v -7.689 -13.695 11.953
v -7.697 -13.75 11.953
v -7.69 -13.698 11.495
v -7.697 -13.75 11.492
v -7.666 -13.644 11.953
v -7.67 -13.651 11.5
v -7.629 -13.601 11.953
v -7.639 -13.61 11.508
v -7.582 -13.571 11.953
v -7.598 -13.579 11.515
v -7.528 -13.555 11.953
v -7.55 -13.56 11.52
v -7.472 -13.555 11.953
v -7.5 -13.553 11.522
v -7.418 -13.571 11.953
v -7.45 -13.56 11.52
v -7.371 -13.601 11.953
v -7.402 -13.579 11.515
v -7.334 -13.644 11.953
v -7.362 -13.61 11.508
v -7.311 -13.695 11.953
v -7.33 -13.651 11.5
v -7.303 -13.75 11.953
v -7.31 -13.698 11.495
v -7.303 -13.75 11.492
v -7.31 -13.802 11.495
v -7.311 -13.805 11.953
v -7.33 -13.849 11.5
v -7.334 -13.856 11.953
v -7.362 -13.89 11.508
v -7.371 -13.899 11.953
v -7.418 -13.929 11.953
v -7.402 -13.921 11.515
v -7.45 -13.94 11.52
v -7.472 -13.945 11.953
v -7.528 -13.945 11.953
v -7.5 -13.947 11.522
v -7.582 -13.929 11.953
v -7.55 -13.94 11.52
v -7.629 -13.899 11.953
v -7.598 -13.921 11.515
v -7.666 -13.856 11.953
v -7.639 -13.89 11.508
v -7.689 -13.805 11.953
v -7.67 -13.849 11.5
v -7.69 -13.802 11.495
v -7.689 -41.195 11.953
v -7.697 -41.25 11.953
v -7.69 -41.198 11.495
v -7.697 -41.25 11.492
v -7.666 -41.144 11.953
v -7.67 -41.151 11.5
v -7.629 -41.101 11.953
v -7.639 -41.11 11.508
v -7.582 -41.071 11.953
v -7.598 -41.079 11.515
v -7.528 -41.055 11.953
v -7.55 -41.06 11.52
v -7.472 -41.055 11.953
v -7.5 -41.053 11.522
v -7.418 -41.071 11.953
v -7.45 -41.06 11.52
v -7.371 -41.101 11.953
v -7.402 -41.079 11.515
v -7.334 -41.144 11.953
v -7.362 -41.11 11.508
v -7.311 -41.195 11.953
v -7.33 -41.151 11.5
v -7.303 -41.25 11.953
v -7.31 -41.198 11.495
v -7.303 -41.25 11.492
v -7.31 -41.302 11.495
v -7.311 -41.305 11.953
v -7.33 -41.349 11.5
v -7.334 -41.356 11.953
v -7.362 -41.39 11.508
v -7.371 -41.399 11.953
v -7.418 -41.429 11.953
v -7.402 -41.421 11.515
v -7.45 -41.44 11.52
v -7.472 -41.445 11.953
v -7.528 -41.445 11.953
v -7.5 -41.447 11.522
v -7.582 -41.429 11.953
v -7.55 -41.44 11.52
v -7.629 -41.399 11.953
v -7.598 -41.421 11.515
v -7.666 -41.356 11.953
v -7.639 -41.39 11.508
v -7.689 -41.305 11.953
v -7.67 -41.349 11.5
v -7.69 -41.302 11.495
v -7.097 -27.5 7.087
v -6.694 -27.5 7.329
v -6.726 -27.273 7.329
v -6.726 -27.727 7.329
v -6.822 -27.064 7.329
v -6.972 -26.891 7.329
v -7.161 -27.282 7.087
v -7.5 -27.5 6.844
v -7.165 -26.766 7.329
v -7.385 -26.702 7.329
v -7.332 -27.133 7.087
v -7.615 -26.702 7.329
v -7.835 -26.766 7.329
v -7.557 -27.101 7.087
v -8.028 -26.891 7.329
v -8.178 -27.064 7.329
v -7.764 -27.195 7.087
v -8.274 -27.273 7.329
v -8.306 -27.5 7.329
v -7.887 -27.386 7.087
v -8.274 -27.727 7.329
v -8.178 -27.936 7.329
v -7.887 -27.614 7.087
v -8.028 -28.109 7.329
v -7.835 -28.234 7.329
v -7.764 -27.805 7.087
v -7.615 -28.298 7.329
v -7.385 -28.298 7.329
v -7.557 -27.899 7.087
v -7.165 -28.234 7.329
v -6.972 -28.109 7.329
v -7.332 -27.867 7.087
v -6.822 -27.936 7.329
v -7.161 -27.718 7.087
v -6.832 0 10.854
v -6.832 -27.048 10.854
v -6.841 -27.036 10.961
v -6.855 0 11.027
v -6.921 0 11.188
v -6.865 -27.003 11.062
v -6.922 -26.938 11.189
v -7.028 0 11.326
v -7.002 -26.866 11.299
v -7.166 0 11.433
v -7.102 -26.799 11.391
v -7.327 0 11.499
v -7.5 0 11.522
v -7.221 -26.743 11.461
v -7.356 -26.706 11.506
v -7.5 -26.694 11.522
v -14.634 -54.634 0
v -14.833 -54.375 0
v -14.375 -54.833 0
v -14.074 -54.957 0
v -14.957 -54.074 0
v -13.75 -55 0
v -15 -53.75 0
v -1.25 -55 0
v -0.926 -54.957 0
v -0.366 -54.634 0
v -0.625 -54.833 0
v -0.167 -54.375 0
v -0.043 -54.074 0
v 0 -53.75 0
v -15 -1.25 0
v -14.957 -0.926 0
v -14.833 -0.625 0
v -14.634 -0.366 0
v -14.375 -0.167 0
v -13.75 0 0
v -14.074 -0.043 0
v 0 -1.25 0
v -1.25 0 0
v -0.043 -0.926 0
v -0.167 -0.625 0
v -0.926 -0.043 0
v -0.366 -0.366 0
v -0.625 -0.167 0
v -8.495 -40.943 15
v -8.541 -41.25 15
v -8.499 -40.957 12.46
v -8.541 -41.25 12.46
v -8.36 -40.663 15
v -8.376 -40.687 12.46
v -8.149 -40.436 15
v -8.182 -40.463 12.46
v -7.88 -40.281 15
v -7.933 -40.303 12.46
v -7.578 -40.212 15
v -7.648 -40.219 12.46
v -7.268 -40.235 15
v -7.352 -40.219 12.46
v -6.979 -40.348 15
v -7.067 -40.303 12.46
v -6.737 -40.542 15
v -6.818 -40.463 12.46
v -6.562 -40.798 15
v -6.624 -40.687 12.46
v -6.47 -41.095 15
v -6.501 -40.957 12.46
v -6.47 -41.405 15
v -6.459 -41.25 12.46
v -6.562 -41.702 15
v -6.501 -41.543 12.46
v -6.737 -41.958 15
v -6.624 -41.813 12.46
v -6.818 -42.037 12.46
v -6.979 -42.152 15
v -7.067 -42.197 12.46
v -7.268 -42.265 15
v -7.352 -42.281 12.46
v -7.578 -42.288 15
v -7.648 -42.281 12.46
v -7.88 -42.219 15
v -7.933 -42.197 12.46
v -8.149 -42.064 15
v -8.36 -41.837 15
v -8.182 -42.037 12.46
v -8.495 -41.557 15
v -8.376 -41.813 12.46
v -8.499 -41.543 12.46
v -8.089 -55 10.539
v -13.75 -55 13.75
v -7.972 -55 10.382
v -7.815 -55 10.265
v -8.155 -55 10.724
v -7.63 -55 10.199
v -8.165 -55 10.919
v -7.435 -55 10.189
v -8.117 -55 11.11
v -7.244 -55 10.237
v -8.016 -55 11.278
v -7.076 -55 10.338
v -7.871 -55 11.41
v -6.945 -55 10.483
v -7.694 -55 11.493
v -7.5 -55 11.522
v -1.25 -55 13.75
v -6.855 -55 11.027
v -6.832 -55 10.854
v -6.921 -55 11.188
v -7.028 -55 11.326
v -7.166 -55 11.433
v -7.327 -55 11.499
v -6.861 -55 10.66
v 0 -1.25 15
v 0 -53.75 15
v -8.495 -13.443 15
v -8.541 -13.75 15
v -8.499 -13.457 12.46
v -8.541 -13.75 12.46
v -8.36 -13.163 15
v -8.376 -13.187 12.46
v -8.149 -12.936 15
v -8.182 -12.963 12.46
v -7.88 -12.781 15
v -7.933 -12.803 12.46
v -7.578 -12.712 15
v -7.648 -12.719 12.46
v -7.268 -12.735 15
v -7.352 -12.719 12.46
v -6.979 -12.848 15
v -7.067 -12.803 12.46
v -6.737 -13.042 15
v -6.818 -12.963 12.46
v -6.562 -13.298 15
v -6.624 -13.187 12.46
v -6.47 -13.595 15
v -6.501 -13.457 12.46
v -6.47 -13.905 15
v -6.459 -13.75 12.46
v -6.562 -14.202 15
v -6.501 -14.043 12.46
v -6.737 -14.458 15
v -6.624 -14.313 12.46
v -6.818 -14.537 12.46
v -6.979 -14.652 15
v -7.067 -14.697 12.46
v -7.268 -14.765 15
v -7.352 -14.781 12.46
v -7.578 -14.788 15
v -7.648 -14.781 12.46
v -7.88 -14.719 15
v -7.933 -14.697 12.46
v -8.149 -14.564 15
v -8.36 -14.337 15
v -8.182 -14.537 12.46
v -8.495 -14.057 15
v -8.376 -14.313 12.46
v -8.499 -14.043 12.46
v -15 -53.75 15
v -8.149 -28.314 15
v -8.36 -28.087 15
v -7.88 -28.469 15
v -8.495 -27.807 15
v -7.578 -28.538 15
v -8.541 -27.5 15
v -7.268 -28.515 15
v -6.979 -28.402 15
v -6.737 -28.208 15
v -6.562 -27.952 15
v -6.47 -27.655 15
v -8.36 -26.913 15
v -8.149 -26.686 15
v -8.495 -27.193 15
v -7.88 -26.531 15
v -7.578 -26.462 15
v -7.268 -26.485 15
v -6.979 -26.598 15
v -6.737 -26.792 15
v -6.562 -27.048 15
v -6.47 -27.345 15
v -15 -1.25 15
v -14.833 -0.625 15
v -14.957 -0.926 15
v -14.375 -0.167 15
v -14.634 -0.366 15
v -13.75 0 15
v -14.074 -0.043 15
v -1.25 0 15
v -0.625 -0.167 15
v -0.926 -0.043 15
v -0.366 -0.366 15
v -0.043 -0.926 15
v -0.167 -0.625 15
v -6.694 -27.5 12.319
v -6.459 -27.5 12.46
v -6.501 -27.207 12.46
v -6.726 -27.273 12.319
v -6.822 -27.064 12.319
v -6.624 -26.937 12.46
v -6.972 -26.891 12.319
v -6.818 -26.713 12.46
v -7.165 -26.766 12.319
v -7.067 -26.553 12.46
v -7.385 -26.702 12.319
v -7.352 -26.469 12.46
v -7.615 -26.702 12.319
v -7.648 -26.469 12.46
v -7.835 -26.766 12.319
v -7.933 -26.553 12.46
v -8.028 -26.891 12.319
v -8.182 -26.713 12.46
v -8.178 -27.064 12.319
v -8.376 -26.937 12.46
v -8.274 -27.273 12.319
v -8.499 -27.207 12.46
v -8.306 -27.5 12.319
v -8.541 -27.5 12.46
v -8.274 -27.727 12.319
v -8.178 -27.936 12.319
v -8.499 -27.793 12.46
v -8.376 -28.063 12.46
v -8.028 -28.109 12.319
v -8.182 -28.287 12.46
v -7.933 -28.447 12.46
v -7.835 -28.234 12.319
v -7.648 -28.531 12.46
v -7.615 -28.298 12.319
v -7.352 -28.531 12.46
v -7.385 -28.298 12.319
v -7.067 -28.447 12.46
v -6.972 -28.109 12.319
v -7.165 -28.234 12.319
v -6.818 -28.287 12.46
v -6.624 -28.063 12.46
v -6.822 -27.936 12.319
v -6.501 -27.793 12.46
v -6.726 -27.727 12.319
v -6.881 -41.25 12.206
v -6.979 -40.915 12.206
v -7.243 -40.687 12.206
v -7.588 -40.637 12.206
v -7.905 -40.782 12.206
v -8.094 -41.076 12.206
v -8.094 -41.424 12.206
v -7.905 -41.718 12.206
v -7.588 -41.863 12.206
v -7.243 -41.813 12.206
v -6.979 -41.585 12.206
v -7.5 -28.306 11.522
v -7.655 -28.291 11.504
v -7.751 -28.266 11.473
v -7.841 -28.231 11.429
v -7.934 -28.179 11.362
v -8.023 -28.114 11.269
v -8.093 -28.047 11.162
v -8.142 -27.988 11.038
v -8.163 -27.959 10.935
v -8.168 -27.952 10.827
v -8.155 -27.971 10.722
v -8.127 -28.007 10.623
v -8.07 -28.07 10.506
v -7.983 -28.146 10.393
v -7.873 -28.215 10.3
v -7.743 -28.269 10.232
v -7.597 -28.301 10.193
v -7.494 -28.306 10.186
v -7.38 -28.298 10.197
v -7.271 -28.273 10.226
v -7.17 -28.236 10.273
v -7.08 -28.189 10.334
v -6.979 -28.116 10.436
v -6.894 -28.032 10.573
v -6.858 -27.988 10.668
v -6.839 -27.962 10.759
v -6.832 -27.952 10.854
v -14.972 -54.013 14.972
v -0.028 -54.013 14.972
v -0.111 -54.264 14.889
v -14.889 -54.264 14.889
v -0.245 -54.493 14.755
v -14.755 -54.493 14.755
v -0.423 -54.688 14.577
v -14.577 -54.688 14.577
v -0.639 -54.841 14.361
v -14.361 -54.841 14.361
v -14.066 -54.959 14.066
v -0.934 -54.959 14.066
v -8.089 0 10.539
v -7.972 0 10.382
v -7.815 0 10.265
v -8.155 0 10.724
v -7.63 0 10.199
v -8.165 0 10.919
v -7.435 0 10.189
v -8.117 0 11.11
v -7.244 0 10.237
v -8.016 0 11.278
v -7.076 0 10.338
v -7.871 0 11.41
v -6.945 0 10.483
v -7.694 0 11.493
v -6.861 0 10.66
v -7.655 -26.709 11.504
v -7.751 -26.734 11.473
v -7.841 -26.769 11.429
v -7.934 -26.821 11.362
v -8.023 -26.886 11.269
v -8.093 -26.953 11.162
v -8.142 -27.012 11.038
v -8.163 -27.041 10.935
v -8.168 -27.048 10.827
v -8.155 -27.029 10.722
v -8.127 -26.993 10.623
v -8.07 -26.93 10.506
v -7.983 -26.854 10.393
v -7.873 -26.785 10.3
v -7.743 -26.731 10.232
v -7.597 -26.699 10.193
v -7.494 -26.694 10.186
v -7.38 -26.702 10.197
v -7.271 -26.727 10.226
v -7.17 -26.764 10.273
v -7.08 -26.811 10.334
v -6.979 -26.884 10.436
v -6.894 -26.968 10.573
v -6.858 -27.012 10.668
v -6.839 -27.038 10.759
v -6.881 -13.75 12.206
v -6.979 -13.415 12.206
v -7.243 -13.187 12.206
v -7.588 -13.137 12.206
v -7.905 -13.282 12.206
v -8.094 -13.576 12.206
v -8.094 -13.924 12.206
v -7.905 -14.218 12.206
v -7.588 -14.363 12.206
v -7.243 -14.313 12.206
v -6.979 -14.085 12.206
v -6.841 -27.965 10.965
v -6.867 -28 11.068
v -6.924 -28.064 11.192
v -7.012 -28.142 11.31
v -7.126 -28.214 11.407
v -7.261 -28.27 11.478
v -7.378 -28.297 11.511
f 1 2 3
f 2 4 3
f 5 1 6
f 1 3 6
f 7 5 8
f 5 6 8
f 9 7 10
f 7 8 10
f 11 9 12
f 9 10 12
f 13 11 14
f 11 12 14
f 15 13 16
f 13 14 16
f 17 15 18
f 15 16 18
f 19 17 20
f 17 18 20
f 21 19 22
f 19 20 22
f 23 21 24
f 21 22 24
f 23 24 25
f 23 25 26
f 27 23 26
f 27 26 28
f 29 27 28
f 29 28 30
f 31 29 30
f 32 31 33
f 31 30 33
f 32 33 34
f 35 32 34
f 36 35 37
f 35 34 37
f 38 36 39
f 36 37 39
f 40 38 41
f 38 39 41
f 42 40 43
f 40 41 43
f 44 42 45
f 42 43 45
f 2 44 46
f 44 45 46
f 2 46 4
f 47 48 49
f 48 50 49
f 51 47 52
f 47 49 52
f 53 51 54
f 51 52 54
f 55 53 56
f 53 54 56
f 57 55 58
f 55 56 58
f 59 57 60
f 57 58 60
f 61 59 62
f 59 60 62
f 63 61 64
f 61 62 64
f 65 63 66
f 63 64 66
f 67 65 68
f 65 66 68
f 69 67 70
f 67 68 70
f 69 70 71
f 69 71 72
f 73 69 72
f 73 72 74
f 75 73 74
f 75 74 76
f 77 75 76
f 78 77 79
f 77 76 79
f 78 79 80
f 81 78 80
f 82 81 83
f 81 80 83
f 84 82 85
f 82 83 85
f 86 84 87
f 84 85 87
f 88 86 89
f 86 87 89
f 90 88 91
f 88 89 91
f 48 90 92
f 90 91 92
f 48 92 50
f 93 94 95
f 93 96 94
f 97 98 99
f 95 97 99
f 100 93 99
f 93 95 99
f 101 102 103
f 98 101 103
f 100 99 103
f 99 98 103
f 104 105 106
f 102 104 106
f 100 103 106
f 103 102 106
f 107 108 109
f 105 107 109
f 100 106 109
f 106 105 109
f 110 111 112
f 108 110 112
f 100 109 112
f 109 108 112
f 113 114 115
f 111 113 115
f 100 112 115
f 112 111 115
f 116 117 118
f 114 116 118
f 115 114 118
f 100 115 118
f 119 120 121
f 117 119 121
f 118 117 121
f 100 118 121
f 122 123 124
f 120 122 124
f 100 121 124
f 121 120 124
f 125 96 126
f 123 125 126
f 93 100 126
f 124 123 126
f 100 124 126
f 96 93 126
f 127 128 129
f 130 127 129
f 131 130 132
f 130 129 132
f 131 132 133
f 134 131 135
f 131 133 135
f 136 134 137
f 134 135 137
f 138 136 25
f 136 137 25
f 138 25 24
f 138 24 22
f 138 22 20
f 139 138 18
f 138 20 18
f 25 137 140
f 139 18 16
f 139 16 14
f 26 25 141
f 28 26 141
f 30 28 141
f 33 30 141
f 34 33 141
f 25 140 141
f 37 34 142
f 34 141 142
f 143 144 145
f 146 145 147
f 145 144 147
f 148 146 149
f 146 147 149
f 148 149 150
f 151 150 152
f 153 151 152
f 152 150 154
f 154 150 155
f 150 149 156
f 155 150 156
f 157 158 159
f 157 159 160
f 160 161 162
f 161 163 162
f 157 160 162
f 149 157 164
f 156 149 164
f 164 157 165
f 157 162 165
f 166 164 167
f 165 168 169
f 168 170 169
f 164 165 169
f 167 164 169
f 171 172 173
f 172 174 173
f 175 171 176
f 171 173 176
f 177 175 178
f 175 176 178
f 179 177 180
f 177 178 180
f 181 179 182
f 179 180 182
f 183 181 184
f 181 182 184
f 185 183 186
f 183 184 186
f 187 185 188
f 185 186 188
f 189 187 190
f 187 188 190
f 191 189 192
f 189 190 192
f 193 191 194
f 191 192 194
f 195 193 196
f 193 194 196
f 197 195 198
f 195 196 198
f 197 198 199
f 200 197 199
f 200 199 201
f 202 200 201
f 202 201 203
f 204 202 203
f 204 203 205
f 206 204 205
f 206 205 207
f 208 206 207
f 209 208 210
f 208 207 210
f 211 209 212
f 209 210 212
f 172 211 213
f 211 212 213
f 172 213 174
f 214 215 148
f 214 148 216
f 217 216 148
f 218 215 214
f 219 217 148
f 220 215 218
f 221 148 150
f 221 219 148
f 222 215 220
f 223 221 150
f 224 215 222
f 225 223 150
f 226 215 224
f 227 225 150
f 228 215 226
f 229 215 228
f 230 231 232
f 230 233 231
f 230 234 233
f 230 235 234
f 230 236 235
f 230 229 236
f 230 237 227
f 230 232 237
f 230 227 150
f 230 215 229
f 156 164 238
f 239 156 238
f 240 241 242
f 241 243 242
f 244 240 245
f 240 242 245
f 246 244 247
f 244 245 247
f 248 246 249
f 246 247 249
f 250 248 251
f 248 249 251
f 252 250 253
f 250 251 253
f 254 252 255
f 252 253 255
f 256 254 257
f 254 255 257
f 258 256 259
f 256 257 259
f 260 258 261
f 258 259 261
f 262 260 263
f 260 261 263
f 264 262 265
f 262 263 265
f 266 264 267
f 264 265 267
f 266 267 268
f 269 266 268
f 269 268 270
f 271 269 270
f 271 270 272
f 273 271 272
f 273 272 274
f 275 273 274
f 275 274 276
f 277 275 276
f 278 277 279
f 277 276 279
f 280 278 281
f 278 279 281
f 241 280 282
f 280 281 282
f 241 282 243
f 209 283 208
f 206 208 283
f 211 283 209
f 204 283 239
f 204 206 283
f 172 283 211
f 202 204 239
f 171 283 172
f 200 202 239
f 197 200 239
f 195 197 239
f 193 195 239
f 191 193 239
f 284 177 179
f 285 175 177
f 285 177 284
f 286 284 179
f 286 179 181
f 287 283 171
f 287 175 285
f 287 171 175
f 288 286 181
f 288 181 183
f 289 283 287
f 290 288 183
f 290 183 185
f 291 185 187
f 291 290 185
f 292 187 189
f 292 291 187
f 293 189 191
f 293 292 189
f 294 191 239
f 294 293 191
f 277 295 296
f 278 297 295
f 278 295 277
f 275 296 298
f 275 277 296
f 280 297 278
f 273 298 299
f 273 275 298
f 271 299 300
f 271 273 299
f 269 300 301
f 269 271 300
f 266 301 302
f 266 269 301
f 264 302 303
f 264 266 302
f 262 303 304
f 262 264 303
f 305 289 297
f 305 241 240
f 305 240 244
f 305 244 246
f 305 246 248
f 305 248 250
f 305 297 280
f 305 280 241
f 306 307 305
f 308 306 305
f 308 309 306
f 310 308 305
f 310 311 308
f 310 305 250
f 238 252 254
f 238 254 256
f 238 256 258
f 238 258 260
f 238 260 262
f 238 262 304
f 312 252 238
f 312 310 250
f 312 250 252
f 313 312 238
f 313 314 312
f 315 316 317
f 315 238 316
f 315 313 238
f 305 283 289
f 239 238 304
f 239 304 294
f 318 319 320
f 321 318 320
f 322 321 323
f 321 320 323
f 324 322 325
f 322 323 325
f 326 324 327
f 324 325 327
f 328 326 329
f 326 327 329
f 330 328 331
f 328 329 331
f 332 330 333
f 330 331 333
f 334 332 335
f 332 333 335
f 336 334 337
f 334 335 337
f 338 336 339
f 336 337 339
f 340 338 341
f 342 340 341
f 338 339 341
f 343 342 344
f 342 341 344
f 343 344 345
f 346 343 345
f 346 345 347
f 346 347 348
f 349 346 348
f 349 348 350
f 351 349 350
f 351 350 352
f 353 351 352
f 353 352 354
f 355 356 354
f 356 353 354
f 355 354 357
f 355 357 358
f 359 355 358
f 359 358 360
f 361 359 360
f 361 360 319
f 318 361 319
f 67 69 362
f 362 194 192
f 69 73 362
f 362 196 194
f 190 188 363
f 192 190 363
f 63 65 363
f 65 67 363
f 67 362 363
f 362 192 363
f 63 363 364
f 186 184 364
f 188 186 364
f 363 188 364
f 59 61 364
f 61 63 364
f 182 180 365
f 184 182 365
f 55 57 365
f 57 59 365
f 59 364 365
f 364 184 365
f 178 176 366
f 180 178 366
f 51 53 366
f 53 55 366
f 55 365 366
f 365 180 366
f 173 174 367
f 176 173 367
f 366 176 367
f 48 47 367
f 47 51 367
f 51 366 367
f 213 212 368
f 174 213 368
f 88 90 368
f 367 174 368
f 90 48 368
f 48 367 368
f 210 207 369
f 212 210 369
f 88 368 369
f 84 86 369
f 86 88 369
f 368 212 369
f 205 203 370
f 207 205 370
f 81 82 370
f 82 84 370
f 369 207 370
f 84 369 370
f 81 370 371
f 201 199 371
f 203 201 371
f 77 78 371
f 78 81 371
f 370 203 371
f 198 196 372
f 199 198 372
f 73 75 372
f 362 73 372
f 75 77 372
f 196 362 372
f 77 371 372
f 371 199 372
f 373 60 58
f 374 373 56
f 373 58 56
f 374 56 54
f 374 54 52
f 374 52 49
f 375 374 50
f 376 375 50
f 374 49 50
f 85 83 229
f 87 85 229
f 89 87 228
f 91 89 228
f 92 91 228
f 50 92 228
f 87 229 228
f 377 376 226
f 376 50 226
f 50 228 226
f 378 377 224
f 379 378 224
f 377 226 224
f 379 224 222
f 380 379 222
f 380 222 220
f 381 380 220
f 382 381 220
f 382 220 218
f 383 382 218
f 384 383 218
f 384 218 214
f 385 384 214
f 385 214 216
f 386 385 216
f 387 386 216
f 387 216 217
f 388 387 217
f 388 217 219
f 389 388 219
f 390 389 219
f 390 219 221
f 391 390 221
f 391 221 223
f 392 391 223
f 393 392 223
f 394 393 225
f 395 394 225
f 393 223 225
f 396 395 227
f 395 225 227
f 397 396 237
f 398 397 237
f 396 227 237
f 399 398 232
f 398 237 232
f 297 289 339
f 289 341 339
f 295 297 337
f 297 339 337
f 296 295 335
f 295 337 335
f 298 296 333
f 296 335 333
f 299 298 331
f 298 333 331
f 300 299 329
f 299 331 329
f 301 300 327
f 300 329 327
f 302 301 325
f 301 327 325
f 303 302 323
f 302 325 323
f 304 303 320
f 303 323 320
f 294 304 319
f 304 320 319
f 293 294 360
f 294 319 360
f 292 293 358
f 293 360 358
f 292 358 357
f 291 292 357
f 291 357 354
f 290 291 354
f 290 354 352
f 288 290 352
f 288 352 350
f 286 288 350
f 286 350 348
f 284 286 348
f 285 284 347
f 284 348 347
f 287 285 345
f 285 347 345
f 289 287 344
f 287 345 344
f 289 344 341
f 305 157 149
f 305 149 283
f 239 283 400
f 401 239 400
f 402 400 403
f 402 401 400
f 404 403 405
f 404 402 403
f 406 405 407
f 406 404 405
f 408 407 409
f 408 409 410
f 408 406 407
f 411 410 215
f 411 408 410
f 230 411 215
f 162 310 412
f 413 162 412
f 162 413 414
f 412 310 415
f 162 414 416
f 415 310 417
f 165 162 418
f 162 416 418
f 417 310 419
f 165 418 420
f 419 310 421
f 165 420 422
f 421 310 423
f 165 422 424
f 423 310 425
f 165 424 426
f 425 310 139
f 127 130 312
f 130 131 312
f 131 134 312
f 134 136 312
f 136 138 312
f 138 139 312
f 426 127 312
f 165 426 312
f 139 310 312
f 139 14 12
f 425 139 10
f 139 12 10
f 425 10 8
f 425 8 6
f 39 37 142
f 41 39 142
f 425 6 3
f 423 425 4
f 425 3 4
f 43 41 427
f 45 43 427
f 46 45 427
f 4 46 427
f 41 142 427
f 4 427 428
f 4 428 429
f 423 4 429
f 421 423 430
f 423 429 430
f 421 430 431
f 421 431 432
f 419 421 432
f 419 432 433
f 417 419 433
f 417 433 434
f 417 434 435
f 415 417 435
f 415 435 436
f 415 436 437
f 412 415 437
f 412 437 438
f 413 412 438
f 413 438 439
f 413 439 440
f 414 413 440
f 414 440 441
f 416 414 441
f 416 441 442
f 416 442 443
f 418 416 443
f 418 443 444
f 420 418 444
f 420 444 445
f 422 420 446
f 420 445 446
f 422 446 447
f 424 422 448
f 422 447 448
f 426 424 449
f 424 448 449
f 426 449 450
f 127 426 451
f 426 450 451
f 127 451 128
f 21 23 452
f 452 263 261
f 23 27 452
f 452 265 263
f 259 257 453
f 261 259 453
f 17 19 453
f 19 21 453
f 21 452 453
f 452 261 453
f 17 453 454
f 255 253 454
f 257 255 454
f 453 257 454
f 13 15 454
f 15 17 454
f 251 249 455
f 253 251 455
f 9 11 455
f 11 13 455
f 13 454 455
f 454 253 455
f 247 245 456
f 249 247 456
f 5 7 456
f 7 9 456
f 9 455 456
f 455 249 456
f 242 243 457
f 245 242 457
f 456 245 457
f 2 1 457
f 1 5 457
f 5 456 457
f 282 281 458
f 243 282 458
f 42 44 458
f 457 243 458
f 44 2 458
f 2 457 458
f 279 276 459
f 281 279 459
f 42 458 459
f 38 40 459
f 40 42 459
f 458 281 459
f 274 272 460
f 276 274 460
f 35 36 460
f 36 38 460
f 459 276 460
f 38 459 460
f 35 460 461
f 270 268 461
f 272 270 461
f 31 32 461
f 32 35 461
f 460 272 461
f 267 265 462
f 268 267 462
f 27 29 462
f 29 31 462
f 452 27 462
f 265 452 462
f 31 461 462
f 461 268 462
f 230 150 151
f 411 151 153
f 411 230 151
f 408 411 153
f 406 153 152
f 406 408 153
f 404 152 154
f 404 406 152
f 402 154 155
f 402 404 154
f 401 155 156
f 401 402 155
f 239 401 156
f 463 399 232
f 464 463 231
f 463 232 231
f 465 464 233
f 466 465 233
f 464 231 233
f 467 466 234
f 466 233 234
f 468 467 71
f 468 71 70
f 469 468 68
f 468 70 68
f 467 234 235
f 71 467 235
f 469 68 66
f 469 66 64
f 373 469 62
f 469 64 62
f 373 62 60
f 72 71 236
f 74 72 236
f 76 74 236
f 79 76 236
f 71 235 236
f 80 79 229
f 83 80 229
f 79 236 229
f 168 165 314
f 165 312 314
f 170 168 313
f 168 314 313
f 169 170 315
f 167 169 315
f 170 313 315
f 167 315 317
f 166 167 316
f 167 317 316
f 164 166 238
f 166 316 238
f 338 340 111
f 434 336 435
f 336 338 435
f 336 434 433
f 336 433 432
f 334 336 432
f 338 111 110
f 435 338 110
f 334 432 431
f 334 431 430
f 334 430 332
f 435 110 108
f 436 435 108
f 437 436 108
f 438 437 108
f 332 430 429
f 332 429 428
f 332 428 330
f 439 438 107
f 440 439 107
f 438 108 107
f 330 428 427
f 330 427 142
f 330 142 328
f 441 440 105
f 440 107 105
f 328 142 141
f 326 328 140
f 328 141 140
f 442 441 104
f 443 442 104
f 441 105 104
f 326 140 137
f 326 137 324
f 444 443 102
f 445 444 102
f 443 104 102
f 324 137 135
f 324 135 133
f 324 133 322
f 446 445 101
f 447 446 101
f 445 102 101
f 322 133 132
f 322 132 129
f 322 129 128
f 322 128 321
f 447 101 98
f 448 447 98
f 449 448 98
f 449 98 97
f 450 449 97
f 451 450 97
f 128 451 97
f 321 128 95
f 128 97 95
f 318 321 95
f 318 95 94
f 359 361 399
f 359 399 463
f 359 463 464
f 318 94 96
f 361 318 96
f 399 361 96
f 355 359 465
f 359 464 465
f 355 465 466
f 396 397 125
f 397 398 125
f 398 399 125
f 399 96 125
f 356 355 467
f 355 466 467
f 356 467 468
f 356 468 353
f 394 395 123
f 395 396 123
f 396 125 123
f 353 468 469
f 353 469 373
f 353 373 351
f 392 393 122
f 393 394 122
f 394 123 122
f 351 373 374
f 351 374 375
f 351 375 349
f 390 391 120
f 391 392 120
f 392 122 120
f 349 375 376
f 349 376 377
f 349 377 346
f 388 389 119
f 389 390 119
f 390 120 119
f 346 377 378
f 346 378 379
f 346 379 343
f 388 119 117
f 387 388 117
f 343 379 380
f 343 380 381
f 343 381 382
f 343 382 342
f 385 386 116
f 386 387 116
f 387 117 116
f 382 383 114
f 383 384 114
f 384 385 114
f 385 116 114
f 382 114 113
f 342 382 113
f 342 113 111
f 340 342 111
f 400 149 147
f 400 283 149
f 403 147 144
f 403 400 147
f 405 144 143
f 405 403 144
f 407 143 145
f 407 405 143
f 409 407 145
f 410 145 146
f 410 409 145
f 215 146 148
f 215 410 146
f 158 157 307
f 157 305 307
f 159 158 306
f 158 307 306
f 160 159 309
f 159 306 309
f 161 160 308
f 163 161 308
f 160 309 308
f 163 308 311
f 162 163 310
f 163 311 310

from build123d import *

# Parameters (mm, degrees)
F0_W     = 15
F0_H     = 15
F1_DEPTH = 55
F3_D     = 2.0828
F3_DEPTH = 2.54
F3_TIP   = 0.6257362487
F4_D     = 0.3937
F4_DEPTH = 0.889
F4_START = 3.0474568
F4_TIP   = 0.1182794129
F6_DEPTH = 58
F7_R     = 1.25
F8_D     = 1.6129
F8_DEPTH = 4.99
F8_START = 2.6811722
F8_TIP   = 0.4845640462


with BuildPart() as f1:
    # F0 (on Front) → F1 (new body)
    with BuildSketch(Plane.XZ):
        with Locations((-7.5, 7.5)):
            Rectangle(F0_W, F0_H)
    extrude(amount=F1_DEPTH)

    # F3
    with Locations(Plane.XY.offset(15)):
        with Locations((-7.5, -41.25), (-7.4999998324, -27.5), (-7.5, -13.7499999255)):
            Hole(F3_D / 2, depth=F3_DEPTH)
            with Locations((0, 0, -(F3_DEPTH + F3_TIP / 2))):  # 118° drill point
                Cone(0, F3_D / 2, F3_TIP, mode=Mode.SUBTRACT)

    # F4
    # its depths count from where the whole tool has entered the part; down to there all is cleared
    with Locations(Plane.XY.offset(15)):
        with Locations((-7.4999998324, -27.5), (-7.5, -13.7499999255), (-7.5, -41.25)):
            Hole(F4_D / 2, depth=F4_START)
    with Locations(Plane.XY.offset(15).offset(-F4_START)):
        with Locations((-7.4999998324, -27.5), (-7.5, -13.7499999255), (-7.5, -41.25)):
            Hole(F4_D / 2, depth=F4_DEPTH)
            with Locations((0, 0, -(F4_DEPTH + F4_TIP / 2))):  # 118° drill point
                Cone(0, F4_D / 2, F4_TIP, mode=Mode.SUBTRACT)

    # F5 (on face) → F6 (cut)
    with BuildSketch(Plane.XZ.offset(55)):
        with BuildLine():
            ThreePointArc((-6.8319246429, 10.8540169895), (-7.0275993847, 11.3264176048), (-7.5, 11.5220923465))
            ThreePointArc((-7.5, 11.5220923465), (-7.9724006153, 10.3816163741), (-6.8319246429, 10.8540169895))
        make_face()
    extrude(amount=-F6_DEPTH, mode=Mode.SUBTRACT)

    # F7
    f7_edges = [f1.edges().sort_by_distance(p)[0] for p in [
        (-7.5, -55, 15),
        (0, 0, 7.5),
        (-15, 0, 7.5),
        (-15, -55, 7.5),
        (0, -55, 7.5),
    ]]
    fillet(f7_edges, radius=F7_R)

    # F8
    # its depths count from where the whole tool has entered the part; down to there all is cleared
    with Locations(Plane.XY.offset(15).offset(-F8_START)):
        with Locations((-7.4999998324, -27.5)):
            Hole(F8_D / 2, depth=F8_DEPTH)
            with Locations((0, 0, -(F8_DEPTH + F8_TIP / 2))):  # 118° drill point
                Cone(0, F8_D / 2, F8_TIP, mode=Mode.SUBTRACT)


solid = f1.part
